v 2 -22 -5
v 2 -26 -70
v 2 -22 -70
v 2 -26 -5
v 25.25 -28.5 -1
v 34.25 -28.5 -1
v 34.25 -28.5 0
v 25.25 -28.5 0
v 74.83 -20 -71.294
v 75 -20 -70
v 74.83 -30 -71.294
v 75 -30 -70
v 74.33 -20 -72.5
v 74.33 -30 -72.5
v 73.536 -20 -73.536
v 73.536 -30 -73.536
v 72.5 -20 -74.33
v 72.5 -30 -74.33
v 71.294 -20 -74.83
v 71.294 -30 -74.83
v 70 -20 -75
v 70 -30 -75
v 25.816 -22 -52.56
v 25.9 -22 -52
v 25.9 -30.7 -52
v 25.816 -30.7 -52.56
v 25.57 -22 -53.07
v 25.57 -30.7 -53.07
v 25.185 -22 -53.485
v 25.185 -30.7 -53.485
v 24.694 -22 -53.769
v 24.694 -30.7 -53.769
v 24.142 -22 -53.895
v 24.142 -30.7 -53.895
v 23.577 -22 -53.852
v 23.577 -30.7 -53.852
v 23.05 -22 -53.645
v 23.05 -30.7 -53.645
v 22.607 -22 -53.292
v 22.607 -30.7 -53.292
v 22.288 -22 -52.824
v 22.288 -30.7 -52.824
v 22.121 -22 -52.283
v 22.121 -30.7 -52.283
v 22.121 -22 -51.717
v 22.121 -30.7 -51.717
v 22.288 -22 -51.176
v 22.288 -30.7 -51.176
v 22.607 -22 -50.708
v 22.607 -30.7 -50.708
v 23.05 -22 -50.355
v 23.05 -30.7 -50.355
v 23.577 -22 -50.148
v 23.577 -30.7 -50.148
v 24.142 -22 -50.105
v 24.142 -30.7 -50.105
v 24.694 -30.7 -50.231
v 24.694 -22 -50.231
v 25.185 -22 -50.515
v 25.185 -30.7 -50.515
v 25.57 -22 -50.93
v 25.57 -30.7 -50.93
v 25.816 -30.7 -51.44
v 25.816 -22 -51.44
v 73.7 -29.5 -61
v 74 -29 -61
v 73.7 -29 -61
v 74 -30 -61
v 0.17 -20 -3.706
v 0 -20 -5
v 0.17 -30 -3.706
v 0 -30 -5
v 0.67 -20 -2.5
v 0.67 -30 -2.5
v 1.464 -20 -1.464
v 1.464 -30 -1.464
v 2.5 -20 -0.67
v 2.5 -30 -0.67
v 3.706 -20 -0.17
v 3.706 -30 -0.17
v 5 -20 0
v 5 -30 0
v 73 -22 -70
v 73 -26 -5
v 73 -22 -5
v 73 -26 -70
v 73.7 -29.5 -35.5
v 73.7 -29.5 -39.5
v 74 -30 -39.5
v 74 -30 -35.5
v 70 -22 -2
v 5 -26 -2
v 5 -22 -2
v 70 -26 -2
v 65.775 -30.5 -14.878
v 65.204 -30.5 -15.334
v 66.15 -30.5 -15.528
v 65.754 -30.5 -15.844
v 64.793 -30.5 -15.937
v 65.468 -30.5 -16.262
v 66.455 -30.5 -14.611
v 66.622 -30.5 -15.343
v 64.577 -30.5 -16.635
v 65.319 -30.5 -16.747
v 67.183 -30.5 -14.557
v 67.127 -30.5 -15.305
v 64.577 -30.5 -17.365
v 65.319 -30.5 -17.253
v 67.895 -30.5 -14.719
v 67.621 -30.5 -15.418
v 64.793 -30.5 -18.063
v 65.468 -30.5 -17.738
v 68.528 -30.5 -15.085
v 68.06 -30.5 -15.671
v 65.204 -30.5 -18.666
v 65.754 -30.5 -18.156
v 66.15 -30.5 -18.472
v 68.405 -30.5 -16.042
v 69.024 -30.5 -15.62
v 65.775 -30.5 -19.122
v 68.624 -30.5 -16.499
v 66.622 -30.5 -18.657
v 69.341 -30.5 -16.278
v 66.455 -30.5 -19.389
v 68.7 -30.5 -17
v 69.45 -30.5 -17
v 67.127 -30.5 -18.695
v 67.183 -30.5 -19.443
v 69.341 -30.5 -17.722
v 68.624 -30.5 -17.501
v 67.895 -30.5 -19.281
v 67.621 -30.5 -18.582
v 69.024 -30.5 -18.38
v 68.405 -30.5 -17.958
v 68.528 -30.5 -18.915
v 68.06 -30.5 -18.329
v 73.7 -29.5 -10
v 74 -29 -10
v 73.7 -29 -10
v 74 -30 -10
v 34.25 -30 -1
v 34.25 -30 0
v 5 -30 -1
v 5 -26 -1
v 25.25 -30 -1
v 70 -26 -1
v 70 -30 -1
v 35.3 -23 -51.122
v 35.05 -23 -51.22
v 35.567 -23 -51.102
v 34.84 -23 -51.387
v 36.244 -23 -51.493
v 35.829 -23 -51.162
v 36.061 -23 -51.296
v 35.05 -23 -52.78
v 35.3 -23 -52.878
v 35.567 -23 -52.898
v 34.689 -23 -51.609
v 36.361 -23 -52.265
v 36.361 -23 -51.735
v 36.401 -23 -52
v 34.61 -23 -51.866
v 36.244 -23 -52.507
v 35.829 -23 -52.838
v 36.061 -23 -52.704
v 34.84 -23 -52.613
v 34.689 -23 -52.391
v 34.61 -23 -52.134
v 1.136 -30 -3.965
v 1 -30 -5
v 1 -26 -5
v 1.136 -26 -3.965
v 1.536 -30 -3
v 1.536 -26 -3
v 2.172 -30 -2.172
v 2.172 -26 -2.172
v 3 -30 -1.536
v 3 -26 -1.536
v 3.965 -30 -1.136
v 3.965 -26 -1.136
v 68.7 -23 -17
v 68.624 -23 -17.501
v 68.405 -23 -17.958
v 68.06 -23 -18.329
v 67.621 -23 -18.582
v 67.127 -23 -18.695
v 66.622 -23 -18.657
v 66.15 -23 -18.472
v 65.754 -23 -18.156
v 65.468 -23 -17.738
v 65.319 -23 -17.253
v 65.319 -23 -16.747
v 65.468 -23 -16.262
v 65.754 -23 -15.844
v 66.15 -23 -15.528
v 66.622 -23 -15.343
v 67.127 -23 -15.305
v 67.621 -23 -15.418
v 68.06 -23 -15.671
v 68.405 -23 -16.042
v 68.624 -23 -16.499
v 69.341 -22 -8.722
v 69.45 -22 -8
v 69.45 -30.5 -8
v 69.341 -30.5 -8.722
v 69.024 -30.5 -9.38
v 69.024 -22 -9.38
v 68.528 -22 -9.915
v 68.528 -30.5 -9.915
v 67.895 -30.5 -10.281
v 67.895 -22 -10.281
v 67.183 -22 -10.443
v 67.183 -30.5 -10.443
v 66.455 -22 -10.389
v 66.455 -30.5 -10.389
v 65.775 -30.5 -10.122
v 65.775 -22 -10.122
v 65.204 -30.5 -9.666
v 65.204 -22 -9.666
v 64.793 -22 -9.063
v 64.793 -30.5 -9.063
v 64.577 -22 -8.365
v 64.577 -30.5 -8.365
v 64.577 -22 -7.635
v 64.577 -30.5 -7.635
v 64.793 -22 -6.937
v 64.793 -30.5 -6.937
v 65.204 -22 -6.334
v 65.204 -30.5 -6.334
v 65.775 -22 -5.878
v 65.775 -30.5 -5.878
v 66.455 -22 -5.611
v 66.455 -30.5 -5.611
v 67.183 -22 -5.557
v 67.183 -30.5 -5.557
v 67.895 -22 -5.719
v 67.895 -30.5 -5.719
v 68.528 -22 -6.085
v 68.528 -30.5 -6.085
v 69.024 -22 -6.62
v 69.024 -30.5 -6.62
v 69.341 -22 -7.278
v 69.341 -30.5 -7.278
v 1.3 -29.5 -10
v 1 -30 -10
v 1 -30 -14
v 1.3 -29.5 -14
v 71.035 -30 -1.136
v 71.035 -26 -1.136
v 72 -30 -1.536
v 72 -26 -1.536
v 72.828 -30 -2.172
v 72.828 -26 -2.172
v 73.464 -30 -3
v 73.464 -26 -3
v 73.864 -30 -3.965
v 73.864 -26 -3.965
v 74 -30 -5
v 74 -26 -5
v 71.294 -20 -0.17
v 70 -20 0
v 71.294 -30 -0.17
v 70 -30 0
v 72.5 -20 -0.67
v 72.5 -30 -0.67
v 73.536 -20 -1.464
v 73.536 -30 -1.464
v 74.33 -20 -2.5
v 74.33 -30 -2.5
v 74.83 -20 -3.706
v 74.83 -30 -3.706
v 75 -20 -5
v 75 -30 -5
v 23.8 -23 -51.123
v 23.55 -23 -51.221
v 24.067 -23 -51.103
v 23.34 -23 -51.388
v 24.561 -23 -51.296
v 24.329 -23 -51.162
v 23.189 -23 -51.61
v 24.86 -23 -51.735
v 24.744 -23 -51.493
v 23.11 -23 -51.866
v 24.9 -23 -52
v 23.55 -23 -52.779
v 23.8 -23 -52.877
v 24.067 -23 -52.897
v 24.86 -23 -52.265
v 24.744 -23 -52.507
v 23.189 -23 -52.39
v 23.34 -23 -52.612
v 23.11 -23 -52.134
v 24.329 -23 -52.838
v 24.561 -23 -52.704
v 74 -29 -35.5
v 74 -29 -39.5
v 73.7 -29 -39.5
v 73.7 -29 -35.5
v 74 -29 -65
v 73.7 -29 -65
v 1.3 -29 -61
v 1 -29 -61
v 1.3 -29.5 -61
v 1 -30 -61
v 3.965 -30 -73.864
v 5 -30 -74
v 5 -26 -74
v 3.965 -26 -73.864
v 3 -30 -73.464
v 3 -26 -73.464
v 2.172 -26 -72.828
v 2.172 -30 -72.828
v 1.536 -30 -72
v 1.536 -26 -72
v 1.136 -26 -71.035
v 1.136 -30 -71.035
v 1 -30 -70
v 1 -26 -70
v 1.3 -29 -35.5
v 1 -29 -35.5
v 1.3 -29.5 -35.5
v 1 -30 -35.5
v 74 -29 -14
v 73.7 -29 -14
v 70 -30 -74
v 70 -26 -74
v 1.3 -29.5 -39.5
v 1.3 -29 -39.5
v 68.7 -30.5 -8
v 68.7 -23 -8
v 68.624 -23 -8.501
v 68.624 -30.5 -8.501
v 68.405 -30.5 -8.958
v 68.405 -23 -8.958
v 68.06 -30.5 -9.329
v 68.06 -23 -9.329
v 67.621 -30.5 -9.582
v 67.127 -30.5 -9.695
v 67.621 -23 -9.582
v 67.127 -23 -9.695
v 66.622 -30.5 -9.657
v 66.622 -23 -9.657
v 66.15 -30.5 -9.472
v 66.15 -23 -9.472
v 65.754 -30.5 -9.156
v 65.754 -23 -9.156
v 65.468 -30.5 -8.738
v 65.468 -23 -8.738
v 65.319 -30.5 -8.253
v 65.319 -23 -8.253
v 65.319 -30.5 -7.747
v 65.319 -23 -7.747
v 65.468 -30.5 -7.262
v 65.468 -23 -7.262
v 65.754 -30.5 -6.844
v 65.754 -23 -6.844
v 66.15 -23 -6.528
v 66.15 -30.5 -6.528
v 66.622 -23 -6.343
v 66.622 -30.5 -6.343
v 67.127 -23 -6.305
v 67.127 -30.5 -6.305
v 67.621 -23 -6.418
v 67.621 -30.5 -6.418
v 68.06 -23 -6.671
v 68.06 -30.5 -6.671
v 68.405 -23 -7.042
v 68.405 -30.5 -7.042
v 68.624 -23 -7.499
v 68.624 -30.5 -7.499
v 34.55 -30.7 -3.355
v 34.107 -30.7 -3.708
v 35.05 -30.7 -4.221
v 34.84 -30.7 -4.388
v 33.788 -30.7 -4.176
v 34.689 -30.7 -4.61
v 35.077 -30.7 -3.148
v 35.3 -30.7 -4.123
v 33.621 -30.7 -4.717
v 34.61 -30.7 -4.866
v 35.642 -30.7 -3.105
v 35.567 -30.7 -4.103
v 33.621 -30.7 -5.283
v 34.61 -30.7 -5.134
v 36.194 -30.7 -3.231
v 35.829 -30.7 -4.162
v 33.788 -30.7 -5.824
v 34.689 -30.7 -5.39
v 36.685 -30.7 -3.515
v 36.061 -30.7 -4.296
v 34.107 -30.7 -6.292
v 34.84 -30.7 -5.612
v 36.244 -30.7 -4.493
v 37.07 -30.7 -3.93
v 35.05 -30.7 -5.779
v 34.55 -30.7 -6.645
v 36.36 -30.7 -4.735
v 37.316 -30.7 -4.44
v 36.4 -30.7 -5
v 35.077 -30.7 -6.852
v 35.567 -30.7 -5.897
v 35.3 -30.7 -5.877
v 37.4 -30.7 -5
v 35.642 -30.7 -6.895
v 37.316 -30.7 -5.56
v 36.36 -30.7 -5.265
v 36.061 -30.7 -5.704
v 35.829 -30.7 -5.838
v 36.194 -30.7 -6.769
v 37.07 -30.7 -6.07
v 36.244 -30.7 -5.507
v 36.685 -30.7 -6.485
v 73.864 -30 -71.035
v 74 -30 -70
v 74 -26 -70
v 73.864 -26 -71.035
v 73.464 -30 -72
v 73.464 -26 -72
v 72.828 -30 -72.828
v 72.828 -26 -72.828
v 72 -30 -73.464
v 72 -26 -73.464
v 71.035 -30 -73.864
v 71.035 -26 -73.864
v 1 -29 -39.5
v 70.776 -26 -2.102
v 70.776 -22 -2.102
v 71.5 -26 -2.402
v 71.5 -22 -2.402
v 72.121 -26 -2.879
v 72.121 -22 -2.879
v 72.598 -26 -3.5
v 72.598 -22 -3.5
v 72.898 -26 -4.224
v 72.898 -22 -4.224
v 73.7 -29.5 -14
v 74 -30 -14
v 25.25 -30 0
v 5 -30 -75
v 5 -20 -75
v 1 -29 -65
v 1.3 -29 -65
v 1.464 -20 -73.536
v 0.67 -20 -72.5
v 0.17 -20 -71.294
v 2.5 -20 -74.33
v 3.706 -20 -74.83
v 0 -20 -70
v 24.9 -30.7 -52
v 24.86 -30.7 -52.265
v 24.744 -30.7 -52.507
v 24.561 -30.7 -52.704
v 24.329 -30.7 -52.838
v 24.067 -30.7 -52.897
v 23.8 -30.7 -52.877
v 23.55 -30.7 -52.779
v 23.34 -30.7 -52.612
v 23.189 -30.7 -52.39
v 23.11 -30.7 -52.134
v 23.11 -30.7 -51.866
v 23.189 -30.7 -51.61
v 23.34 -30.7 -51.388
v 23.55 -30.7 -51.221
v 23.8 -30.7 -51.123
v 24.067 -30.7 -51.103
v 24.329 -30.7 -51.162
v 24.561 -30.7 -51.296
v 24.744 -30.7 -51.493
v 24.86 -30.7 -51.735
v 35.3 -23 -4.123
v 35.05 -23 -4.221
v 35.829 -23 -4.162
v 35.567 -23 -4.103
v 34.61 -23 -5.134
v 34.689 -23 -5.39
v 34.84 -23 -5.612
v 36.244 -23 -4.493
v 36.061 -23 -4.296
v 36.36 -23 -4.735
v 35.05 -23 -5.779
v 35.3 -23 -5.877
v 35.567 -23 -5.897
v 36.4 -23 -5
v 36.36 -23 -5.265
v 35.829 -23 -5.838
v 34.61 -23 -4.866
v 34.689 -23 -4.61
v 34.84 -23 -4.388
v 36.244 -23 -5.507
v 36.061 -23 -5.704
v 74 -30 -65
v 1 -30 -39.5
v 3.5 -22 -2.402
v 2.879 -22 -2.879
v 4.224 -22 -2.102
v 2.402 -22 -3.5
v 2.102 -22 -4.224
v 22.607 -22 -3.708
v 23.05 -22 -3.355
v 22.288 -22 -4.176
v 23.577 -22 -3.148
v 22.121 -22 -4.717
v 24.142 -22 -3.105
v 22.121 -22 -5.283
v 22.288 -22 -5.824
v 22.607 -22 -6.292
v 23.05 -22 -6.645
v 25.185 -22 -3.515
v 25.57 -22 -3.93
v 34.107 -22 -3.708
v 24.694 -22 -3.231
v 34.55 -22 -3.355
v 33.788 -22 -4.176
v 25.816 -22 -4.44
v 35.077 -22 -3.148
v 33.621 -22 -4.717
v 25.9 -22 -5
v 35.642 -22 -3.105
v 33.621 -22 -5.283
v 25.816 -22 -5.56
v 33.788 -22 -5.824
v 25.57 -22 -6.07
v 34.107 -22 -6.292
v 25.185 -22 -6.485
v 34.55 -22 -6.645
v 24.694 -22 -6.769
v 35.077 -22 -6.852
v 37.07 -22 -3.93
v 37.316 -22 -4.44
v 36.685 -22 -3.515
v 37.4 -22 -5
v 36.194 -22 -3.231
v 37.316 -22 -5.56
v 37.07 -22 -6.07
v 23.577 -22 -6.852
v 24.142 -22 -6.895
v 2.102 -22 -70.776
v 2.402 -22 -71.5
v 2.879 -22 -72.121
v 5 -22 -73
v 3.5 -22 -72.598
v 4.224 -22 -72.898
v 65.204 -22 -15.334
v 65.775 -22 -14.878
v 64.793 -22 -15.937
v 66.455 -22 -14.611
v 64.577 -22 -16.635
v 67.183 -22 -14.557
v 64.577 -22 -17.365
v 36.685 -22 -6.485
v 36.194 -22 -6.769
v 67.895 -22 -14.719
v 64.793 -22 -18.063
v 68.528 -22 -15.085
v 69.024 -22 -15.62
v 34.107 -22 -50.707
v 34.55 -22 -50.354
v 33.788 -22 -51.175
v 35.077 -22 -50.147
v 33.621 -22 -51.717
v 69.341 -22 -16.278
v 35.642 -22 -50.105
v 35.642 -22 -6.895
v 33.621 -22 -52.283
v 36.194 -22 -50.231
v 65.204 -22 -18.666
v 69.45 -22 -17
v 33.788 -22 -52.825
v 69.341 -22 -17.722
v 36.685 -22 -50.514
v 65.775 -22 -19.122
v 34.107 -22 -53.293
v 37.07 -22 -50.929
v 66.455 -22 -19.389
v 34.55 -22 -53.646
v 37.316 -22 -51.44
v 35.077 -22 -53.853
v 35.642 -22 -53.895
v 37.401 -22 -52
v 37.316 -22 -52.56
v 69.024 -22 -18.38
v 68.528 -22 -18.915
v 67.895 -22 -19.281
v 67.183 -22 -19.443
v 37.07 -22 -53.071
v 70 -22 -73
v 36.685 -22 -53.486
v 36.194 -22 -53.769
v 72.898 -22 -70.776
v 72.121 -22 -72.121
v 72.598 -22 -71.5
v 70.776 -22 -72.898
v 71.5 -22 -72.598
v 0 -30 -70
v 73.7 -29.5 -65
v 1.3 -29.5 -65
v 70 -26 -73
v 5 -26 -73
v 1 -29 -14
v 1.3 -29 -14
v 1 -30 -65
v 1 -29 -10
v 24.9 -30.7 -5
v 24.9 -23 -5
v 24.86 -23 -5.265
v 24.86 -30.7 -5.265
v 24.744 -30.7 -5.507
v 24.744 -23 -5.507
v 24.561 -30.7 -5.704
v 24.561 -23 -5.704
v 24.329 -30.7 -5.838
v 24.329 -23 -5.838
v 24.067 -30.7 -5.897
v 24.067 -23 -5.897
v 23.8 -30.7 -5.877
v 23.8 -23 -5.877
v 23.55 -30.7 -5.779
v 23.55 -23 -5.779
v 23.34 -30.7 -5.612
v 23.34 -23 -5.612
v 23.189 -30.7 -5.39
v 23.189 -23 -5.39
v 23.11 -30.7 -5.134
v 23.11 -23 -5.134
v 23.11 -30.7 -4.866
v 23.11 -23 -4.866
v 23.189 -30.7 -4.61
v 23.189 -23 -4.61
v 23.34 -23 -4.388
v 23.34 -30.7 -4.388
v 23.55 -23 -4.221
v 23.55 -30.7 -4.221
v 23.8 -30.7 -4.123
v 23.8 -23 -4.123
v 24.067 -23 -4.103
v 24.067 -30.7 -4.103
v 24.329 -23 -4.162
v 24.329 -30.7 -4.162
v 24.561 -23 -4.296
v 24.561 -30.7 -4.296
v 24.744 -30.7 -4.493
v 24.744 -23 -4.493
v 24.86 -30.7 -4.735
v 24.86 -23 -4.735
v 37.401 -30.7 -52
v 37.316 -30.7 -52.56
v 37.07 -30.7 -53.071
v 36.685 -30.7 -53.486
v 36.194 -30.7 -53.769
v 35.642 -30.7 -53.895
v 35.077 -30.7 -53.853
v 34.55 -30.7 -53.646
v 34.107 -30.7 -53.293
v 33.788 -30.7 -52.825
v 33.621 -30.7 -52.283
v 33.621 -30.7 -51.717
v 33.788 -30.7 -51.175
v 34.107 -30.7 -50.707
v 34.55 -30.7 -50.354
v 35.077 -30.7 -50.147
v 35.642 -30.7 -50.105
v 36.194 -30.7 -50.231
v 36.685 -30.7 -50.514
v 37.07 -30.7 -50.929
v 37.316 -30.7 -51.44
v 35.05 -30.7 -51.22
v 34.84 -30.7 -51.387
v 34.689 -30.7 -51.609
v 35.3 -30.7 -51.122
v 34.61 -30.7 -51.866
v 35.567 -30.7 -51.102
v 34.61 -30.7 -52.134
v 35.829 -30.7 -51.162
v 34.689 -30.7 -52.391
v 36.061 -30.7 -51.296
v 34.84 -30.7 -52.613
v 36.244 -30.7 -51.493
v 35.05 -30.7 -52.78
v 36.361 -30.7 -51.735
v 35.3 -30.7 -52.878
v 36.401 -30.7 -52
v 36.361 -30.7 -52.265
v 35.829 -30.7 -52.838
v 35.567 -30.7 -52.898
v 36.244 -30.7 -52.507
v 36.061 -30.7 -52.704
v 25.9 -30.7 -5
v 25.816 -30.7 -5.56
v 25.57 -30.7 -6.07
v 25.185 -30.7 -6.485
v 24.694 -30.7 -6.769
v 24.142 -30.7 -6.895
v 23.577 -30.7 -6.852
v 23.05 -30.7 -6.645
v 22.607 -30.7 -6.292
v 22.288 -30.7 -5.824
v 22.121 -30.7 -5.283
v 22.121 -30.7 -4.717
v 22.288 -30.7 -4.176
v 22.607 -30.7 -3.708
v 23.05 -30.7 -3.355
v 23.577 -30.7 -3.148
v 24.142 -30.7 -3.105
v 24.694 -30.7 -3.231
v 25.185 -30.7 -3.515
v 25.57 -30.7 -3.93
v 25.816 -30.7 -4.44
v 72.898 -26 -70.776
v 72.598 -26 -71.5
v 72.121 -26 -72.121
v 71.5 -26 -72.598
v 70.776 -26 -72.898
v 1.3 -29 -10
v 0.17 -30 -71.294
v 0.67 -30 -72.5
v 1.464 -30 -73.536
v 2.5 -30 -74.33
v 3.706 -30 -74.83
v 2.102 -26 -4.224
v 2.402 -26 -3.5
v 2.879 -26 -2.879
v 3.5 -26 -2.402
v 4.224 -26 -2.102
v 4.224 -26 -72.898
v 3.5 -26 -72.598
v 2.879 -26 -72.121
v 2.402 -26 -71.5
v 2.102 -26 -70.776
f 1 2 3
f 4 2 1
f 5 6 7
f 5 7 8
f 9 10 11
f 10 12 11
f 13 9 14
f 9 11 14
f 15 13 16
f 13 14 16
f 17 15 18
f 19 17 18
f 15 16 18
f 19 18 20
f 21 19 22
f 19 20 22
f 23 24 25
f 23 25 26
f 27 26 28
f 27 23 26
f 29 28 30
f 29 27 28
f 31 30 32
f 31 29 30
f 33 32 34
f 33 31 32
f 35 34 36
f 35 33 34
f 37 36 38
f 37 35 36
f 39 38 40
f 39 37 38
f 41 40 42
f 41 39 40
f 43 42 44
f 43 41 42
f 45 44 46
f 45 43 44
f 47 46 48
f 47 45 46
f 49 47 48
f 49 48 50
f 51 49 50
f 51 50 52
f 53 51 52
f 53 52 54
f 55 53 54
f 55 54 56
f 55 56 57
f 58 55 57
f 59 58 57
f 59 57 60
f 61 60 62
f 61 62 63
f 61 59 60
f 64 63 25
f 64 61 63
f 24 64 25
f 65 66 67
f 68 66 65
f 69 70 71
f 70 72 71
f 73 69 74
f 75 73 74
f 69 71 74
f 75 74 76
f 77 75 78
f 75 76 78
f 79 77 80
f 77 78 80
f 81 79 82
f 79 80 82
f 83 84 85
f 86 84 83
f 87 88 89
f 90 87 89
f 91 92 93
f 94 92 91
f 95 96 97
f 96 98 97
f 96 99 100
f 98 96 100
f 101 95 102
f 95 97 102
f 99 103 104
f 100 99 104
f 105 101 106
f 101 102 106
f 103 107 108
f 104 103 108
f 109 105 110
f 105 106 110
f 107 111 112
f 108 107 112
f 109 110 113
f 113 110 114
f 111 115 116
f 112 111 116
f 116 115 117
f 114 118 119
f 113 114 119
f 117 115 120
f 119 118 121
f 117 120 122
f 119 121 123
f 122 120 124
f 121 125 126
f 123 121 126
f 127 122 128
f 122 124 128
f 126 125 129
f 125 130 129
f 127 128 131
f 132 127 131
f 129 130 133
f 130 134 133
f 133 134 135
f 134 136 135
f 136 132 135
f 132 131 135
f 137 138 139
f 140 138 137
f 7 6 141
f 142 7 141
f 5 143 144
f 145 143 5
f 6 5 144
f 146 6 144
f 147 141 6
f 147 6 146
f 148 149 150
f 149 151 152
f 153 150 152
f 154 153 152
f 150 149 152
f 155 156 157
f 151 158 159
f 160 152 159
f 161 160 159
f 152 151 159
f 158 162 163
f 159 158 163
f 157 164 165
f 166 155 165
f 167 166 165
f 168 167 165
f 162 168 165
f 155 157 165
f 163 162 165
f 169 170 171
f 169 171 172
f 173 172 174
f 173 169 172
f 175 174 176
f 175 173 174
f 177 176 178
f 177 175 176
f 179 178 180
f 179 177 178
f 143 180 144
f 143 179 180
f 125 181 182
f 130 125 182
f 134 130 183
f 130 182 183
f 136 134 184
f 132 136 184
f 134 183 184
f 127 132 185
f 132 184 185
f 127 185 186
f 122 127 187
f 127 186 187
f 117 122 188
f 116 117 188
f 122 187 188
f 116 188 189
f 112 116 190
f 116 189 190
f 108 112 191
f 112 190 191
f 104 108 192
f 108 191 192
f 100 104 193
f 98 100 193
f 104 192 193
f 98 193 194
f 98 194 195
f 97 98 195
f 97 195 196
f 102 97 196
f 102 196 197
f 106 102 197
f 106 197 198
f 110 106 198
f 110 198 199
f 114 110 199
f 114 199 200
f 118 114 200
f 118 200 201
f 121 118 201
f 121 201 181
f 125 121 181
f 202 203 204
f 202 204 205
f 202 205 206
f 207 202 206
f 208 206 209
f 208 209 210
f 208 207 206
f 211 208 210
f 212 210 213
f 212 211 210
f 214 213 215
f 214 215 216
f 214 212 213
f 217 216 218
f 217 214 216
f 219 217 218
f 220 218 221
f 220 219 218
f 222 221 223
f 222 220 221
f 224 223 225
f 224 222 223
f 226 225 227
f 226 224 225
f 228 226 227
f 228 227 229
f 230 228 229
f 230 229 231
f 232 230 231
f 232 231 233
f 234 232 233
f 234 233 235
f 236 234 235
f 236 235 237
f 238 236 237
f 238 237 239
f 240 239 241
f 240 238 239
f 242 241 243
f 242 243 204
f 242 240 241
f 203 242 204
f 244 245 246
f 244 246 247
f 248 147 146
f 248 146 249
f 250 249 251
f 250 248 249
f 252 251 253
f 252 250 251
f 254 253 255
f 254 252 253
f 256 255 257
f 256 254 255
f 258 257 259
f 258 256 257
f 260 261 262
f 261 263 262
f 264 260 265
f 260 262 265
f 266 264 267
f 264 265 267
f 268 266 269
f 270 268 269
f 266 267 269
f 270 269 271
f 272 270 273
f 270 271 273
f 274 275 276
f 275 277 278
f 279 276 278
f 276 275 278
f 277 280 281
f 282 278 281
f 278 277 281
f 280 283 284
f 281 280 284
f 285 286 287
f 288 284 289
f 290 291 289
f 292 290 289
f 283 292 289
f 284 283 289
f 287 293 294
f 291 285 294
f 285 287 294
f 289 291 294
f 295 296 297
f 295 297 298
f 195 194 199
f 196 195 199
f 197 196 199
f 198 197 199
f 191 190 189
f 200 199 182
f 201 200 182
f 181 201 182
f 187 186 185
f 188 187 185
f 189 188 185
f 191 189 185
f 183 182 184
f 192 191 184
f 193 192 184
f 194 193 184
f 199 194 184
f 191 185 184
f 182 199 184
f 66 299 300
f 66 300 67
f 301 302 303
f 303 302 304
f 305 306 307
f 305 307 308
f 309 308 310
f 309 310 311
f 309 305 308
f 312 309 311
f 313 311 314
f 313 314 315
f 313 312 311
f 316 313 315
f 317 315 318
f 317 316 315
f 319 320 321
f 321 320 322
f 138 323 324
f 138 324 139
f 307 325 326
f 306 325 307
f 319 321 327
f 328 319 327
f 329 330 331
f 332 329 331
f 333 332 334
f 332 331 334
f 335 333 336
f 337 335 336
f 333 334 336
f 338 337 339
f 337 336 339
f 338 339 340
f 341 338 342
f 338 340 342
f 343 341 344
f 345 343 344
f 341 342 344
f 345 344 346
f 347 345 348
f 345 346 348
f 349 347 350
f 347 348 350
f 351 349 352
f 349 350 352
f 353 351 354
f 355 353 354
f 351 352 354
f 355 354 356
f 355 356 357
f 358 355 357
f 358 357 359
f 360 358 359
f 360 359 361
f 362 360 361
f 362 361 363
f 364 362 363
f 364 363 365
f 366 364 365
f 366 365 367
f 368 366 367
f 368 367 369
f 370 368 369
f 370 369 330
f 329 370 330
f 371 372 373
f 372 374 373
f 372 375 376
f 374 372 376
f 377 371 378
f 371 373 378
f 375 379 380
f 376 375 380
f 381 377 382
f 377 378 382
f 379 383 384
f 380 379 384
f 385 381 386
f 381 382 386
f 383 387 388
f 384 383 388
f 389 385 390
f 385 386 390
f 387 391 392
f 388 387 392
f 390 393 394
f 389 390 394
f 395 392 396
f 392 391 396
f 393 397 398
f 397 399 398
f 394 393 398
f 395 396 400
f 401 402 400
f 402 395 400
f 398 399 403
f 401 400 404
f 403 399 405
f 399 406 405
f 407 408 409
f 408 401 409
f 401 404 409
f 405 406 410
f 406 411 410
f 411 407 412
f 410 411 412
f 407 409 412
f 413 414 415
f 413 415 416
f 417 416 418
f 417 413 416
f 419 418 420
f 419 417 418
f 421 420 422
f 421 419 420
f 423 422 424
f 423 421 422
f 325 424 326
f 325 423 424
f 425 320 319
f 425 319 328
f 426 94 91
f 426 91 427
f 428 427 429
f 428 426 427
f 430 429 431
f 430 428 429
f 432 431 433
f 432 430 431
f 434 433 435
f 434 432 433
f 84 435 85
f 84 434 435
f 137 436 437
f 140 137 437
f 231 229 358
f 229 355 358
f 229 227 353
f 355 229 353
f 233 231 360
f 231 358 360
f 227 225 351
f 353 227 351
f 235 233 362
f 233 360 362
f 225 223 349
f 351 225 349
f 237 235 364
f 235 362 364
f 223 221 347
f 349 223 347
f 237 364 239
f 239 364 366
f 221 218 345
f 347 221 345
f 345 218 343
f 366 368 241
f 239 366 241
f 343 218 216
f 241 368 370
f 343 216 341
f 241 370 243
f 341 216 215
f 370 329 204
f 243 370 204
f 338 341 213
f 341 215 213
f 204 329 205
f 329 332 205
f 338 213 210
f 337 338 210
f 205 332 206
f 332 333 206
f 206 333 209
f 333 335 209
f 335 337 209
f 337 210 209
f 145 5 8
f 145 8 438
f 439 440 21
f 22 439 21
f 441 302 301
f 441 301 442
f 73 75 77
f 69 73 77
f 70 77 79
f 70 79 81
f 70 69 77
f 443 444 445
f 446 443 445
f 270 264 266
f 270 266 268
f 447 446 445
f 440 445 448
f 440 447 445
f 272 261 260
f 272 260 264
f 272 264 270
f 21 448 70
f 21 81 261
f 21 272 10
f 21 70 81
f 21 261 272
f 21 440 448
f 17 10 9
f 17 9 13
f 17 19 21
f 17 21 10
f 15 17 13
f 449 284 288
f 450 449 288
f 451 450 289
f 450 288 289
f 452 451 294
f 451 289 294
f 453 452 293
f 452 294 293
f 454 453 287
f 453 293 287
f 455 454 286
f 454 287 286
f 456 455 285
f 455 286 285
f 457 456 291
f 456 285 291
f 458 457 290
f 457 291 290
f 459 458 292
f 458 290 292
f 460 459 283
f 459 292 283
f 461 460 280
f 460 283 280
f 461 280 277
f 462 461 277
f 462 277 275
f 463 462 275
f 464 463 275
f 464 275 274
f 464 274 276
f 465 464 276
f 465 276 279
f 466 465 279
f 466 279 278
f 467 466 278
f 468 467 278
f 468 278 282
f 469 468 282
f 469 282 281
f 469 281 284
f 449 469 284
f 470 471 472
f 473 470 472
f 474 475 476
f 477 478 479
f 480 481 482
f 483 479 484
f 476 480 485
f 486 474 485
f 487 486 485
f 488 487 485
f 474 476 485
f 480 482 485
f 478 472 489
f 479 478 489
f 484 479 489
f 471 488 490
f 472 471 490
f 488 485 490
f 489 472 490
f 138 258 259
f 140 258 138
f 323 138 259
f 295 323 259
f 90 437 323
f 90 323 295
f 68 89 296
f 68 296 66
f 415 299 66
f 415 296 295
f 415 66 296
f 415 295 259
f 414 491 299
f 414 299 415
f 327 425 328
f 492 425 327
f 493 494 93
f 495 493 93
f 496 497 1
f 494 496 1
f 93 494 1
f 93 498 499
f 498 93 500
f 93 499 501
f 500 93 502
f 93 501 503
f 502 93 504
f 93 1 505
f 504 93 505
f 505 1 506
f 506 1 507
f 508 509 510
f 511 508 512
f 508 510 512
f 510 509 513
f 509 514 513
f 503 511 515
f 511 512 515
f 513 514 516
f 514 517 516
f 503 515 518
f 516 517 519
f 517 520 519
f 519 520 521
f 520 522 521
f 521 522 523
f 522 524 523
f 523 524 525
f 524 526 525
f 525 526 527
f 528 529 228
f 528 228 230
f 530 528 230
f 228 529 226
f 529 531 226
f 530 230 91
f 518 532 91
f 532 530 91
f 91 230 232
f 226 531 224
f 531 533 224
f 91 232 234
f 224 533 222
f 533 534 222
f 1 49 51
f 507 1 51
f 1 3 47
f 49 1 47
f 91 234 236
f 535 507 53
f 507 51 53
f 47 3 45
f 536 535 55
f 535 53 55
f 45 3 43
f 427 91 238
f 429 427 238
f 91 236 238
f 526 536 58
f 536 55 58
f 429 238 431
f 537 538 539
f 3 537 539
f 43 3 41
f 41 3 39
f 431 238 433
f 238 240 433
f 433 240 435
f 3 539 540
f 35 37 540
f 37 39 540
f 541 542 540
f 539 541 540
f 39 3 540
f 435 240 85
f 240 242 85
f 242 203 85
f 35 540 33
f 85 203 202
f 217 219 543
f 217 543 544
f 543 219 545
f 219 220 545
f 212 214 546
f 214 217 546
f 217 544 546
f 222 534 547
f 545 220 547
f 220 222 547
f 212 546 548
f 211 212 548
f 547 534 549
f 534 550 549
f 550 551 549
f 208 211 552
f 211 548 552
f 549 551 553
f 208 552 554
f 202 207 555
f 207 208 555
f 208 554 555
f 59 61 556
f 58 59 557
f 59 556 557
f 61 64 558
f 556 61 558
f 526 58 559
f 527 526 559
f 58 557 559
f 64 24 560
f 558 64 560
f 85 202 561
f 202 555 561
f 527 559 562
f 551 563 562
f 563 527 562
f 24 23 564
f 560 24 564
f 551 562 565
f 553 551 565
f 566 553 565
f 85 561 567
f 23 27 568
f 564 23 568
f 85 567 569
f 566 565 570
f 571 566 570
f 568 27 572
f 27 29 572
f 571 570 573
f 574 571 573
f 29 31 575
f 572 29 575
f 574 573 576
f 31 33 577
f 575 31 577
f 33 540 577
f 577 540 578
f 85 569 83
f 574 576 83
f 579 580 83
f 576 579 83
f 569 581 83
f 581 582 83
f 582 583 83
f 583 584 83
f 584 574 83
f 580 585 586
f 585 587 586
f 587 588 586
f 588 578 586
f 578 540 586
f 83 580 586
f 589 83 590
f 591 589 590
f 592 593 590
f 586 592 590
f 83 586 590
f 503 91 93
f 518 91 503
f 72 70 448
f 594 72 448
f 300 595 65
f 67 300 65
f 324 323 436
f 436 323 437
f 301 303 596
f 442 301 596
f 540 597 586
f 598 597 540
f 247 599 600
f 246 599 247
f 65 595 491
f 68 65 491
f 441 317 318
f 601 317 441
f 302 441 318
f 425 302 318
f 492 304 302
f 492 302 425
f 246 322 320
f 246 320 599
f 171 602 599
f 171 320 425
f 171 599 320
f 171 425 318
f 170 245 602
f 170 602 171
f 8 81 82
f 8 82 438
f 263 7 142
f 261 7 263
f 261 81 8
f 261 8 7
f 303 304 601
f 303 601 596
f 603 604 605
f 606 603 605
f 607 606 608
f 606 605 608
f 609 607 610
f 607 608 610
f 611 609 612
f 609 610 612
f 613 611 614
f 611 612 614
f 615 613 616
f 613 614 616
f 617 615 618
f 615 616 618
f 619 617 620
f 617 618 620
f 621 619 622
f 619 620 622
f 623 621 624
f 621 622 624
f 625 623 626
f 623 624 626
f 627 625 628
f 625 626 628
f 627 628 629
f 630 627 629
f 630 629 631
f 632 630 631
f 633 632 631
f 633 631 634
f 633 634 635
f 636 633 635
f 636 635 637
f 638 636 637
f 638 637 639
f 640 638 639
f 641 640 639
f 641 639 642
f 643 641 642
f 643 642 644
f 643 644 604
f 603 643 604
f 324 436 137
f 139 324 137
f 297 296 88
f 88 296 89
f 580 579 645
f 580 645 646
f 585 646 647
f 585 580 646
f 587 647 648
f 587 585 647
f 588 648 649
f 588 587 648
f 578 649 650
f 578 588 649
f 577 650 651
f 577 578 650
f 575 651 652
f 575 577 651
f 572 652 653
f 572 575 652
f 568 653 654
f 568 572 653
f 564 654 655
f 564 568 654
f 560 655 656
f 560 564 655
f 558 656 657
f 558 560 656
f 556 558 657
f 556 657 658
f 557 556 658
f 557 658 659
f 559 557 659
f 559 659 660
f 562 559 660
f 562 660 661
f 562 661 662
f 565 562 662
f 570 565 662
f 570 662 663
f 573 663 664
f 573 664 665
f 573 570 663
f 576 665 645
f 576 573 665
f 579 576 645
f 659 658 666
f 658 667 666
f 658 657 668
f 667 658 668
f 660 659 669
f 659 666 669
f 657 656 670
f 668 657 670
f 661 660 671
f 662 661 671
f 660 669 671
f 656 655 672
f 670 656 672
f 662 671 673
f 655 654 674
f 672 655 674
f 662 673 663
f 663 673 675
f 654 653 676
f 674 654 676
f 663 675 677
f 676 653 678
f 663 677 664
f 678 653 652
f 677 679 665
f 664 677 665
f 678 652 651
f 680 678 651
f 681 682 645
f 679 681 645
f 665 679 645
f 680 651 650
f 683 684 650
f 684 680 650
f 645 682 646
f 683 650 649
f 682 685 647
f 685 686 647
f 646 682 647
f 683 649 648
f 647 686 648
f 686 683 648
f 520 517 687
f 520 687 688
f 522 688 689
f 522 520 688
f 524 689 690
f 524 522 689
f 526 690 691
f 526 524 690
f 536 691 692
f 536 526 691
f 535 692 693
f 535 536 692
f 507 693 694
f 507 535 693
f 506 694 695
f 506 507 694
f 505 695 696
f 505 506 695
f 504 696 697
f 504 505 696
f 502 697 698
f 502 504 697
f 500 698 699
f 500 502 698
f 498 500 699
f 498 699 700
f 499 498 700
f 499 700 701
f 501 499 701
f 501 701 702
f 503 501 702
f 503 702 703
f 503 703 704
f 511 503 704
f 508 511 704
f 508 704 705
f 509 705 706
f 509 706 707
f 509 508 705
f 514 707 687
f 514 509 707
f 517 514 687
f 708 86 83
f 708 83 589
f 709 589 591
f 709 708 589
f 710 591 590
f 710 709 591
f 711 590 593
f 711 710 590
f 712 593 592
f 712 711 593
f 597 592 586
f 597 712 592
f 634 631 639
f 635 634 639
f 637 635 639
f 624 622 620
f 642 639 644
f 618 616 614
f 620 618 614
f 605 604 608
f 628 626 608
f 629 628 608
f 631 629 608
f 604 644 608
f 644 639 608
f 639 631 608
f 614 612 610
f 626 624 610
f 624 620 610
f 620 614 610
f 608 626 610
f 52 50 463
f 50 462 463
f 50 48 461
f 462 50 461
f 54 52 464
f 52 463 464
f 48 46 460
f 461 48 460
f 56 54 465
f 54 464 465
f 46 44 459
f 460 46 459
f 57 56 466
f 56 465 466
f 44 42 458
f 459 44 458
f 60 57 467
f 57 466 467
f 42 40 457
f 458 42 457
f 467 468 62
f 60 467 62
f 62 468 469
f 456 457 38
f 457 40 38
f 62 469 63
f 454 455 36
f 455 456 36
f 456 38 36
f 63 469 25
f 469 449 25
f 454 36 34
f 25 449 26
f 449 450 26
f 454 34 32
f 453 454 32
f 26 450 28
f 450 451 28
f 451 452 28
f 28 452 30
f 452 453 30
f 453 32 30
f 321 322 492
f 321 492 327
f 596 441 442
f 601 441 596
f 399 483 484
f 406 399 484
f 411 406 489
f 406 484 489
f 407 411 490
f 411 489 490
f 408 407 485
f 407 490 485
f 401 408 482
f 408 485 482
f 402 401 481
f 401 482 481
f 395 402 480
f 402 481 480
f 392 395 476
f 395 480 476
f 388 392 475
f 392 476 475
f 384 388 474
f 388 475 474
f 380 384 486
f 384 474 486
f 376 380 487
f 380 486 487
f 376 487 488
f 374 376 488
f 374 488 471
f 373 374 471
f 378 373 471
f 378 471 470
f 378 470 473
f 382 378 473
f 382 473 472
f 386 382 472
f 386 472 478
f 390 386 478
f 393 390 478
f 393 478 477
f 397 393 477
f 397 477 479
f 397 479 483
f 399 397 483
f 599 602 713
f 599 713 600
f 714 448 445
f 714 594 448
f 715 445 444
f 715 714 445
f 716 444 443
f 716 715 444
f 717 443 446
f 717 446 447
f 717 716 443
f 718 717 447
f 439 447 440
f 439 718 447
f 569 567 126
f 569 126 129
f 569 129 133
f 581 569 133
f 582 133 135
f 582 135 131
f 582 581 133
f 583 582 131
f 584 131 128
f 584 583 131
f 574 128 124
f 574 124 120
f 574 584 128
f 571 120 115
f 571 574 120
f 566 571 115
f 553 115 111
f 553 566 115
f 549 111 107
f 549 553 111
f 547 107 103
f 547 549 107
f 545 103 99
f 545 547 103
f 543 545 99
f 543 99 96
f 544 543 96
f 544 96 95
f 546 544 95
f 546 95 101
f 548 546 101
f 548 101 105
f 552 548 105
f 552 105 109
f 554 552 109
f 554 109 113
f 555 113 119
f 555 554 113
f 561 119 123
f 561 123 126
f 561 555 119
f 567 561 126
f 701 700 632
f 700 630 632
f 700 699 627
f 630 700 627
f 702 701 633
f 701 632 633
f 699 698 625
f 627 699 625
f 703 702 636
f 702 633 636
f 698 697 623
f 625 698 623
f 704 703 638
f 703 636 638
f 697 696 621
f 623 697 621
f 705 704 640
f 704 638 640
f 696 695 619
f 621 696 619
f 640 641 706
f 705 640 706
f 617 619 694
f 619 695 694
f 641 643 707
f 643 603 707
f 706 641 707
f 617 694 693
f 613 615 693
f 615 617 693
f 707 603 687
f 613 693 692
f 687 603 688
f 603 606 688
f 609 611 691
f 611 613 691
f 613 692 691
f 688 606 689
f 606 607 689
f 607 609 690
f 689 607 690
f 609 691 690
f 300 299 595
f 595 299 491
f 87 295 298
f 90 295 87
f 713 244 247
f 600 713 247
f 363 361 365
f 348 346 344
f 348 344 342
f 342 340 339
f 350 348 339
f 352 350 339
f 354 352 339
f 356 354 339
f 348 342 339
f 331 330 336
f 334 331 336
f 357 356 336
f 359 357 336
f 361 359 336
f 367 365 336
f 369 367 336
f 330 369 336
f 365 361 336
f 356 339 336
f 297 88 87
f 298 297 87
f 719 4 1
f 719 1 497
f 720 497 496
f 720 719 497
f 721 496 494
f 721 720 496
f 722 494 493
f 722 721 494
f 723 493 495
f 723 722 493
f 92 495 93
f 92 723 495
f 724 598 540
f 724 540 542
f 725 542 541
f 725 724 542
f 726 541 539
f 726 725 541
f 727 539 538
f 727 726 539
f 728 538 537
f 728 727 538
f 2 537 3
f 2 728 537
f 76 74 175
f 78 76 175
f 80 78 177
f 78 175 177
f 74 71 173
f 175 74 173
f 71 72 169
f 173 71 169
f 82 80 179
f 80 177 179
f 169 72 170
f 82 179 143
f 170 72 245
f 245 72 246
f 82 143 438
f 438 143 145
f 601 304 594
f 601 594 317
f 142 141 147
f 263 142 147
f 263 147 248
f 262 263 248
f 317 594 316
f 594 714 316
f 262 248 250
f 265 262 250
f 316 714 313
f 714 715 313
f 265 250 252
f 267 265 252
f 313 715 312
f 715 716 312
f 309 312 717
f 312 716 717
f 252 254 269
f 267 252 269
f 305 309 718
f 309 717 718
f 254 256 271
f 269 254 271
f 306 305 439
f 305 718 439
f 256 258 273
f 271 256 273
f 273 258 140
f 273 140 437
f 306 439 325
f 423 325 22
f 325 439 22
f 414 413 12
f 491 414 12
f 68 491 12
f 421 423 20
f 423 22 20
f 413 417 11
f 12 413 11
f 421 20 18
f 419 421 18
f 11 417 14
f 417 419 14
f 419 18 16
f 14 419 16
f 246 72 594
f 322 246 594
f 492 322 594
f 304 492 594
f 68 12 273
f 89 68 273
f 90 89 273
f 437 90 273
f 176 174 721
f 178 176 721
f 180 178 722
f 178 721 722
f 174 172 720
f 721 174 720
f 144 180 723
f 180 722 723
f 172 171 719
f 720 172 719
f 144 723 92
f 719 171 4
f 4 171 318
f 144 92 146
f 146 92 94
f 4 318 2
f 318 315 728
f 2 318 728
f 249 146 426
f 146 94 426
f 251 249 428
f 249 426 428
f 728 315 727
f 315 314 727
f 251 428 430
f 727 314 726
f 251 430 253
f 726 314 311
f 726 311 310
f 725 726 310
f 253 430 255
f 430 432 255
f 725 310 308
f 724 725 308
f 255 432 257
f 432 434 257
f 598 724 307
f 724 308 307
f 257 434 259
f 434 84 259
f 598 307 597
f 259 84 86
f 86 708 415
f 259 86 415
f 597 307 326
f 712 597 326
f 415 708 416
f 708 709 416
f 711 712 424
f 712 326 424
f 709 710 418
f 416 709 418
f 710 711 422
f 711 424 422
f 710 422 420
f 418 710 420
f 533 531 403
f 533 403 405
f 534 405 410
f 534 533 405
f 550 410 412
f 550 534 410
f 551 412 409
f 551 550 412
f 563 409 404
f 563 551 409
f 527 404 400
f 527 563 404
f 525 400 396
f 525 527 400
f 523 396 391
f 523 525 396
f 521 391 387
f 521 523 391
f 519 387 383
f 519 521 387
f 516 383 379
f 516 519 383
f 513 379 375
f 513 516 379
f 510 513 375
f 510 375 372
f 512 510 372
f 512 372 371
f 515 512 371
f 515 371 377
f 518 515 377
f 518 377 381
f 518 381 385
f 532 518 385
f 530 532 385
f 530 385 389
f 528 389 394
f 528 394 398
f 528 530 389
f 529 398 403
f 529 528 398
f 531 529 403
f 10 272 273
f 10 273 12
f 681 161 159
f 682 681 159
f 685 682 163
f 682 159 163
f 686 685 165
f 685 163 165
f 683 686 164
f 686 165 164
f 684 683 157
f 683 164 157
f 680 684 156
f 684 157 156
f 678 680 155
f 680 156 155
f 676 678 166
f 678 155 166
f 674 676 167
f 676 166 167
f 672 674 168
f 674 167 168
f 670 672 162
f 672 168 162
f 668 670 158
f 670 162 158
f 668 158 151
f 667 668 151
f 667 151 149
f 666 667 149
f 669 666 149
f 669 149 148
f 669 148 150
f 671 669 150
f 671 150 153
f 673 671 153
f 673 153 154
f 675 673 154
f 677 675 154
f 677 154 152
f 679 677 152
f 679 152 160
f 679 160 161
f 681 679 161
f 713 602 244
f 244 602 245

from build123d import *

# Parameters (mm, degrees)
SZKIC1_W                    = 75
SZKIC1_H                    = 75
DODANIE_WYCI_GNI_CIE1_DEPTH = 10
ZAOKR_GLENIE1_R             = 5
WYTNIJ_WYCI_GNI_CIE1_DEPTH  = 8
WYTNIJ_WYCI_GNI_CIE2_DEPTH  = 4
SZKIC7_R                    = 1.9
SZKIC7_R_2                  = 0.9
SZKIC7_R_3                  = 1.900523095
SZKIC7_R_4                  = 0.900523095
DODANIE_WYCI_GNI_CIE2_DEPTH = 8.7
SZKIC9_R                    = 0.900523095
SZKIC9_R_2                  = 0.9
DODANIE_WYCI_GNI_CIE3_DEPTH = 1
SZKIC10_R                   = 1.7
DODANIE_WYCI_GNI_CIE4_DEPTH = 1
SZKIC11_R                   = 2.45
SZKIC11_R_2                 = 1.7
DODANIE_WYCI_GNI_CIE5_DEPTH = 8.5
SZKIC19_W                   = 9
SZKIC19_H                   = 1.5
WYTNIJ_WYCI_GNI_CIE15_DEPTH = 10
SZKIC22_W                   = 4
SZKIC22_H                   = 1
DODANIE_WYCI_GNI_CIE6_DEPTH = 0.3
SZKIC24_W                   = 4
SZKIC24_H                   = 1
DODANIE_WYCI_GNI_CIE7_DEPTH = 0.3
WYTNIJ_WYCI_GNI_CIE13_DEPTH = 55
WYTNIJ_WYCI_GNI_CIE14_DEPTH = 55


with BuildPart() as part:
    # Szkic1 → Dodanie-wyciągnięcie1 (new body)
    with BuildSketch(Plane(origin=(0, 0, 0), x_dir=(1, 0, 0), z_dir=(0, 1, 0))):
        with Locations((37.5, 37.5)):
            Rectangle(SZKIC1_W, SZKIC1_H)
    extrude(amount=DODANIE_WYCI_GNI_CIE1_DEPTH)

    # Zaokrąglenie1
    zaokr_glenie1_edges = [part.edges().sort_by_distance(p)[0] for p in [
        (0, 5, 0),
        (0, 5, -75),
        (75, 5, -75),
        (75, 5, 0),
    ]]
    fillet(zaokr_glenie1_edges, radius=ZAOKR_GLENIE1_R)

    # Szkic4 → Wytnij-wyciągnięcie1 (cut)
    with BuildSketch(Plane(origin=(0, 10, 0), x_dir=(1, 0, 0), z_dir=(0, 1, 0))):
        with BuildLine():
            Line((2, 70), (2, 5))
            ThreePointArc((2, 5), (2.878679656, 2.878679656), (5, 2))
            Line((5, 2), (70, 2))
            ThreePointArc((70, 2), (72.121320344, 2.878679656), (73, 5))
            Line((73, 5), (73, 70))
            ThreePointArc((73, 70), (72.121320344, 72.121320344), (70, 73))
            Line((70, 73), (5, 73))
            ThreePointArc((5, 73), (2.878679656, 72.121320344), (2, 70))
        make_face()
    extrude(amount=-WYTNIJ_WYCI_GNI_CIE1_DEPTH, mode=Mode.SUBTRACT)

    # Szkic6 → Wytnij-wyciągnięcie2 (cut)
    with BuildSketch(Plane(origin=(0, 10, 0), x_dir=(1, 0, 0), z_dir=(0, 1, 0))):
        with BuildLine():
            Line((1, 70), (1, 5))
            ThreePointArc((1, 5), (2.171572875, 2.171572875), (5, 1))
            Line((5, 1), (70, 1))
            ThreePointArc((70, 1), (72.828427125, 2.171572875), (74, 5))
            Line((74, 5), (74, 70))
            ThreePointArc((74, 70), (72.828427125, 72.828427125), (70, 74))
            Line((70, 74), (5, 74))
            ThreePointArc((5, 74), (2.171572875, 72.828427125), (1, 70))
        make_face()
        with BuildLine():
            Line((2, 70), (2, 5))
            ThreePointArc((2, 5), (2.878679656, 2.878679656), (5, 2))
            Line((5, 2), (70, 2))
            ThreePointArc((70, 2), (72.121320344, 2.878679656), (73, 5))
            Line((73, 5), (73, 70))
            ThreePointArc((73, 70), (72.121320344, 72.121320344), (70, 73))
            Line((70, 73), (5, 73))
            ThreePointArc((5, 73), (2.878679656, 72.121320344), (2, 70))
        make_face(mode=Mode.SUBTRACT)
    extrude(amount=-WYTNIJ_WYCI_GNI_CIE2_DEPTH, mode=Mode.SUBTRACT)

    # Szkic7 → Dodanie-wyciągnięcie2 (add)
    with BuildSketch(Plane(origin=(0, 2, 0), x_dir=(1, 0, 0), z_dir=(0, 1, 0))):
        with Locations((24, 52)):
            Circle(SZKIC7_R)
        with Locations((24, 52)):
            Circle(SZKIC7_R_2, mode=Mode.SUBTRACT)
        with Locations((35.5, 52)):
            Circle(SZKIC7_R_3)
        with Locations((35.5, 52)):
            Circle(SZKIC7_R_4, mode=Mode.SUBTRACT)
        with Locations((35.5, 5)):
            Circle(SZKIC7_R)
        with Locations((35.5, 5)):
            Circle(SZKIC7_R_2, mode=Mode.SUBTRACT)
        with Locations((24, 5)):
            Circle(SZKIC7_R)
        with Locations((24, 5)):
            Circle(SZKIC7_R_2, mode=Mode.SUBTRACT)
    extrude(amount=DODANIE_WYCI_GNI_CIE2_DEPTH)

    # Szkic9 → Dodanie-wyciągnięcie3 (add)
    with BuildSketch(Plane(origin=(0, 2, 0), x_dir=(1, 0, 0), z_dir=(0, 1, 0))):
        with Locations((35.5, 52)):
            Circle(SZKIC9_R)
        with Locations((35.5, 5)):
            Circle(SZKIC9_R_2)
        with Locations((24, 5)):
            Circle(SZKIC9_R_2)
        with Locations((24, 52)):
            Circle(SZKIC9_R_2)
    extrude(amount=DODANIE_WYCI_GNI_CIE3_DEPTH)

    # Szkic10 → Dodanie-wyciągnięcie4 (add)
    with BuildSketch(Plane(origin=(0, 2, 0), x_dir=(1, 0, 0), z_dir=(0, 1, 0))):
        with Locations((67, 17)):
            Circle(SZKIC10_R)
        with Locations((67, 8)):
            Circle(SZKIC10_R)
    extrude(amount=DODANIE_WYCI_GNI_CIE4_DEPTH)

    # Szkic11 → Dodanie-wyciągnięcie5 (add)
    with BuildSketch(Plane(origin=(0, 2, 0), x_dir=(1, 0, 0), z_dir=(0, 1, 0))):
        with Locations((67, 17)):
            Circle(SZKIC11_R)
        with Locations((67, 17)):
            Circle(SZKIC11_R_2, mode=Mode.SUBTRACT)
        with Locations((67, 8)):
            Circle(SZKIC11_R)
        with Locations((67, 8)):
            Circle(SZKIC11_R_2, mode=Mode.SUBTRACT)
    extrude(amount=DODANIE_WYCI_GNI_CIE5_DEPTH)

    # Szkic19 → Wytnij-wyciągnięcie15 (cut)
    with BuildSketch(Plane(origin=(0, 0, -2), x_dir=(-1, 0, 0), z_dir=(0, 0, -1))):
        with Locations((-29.75, 9.25)):
            Rectangle(SZKIC19_W, SZKIC19_H)
    extrude(amount=-WYTNIJ_WYCI_GNI_CIE15_DEPTH, mode=Mode.SUBTRACT)

    # Szkic22 → Dodanie-wyciągnięcie6 (add)
    with BuildSketch(Plane.ZY.offset(-74)):
        with Locations((-37.5, 9.5)):
            Rectangle(SZKIC22_W, SZKIC22_H)
        with Locations((-63, 9.5)):
            Rectangle(SZKIC22_W, SZKIC22_H)
        with Locations((-12, 9.5)):
            Rectangle(SZKIC22_W, SZKIC22_H)
    extrude(amount=DODANIE_WYCI_GNI_CIE6_DEPTH)

    # Szkic24 → Dodanie-wyciągnięcie7 (add)
    with BuildSketch(Plane(origin=(1, 0, 0), x_dir=(0, 0, -1), z_dir=(1, 0, 0))):
        with Locations((12, 9.5)):
            Rectangle(SZKIC24_W, SZKIC24_H)
        with Locations((63, 9.5)):
            Rectangle(SZKIC24_W, SZKIC24_H)
        with Locations((37.5, 9.5)):
            Rectangle(SZKIC24_W, SZKIC24_H)
    extrude(amount=DODANIE_WYCI_GNI_CIE7_DEPTH)

    # Szkic25 → Wytnij-wyciągnięcie13 (cut)
    with BuildSketch(Plane.XY.offset(-10)):
        Polygon((1, 10), (1.3, 9.5), (1.3, 10), align=None)
    extrude(amount=-WYTNIJ_WYCI_GNI_CIE13_DEPTH, mode=Mode.SUBTRACT)

    # Szkic26 → Wytnij-wyciągnięcie14 (cut)
    with BuildSketch(Plane(origin=(0, 0, -65), x_dir=(-1, 0, 0), z_dir=(0, 0, -1))):
        Polygon((-74, 10), (-73.7, 10), (-73.7, 9.5), align=None)
    extrude(amount=-WYTNIJ_WYCI_GNI_CIE14_DEPTH, mode=Mode.SUBTRACT)


with BuildPart() as body_2:
    # Lustro5: mirrored copy
    add(part.part.mirror(Plane.ZX.offset(-10)))


solid = body_2.part
